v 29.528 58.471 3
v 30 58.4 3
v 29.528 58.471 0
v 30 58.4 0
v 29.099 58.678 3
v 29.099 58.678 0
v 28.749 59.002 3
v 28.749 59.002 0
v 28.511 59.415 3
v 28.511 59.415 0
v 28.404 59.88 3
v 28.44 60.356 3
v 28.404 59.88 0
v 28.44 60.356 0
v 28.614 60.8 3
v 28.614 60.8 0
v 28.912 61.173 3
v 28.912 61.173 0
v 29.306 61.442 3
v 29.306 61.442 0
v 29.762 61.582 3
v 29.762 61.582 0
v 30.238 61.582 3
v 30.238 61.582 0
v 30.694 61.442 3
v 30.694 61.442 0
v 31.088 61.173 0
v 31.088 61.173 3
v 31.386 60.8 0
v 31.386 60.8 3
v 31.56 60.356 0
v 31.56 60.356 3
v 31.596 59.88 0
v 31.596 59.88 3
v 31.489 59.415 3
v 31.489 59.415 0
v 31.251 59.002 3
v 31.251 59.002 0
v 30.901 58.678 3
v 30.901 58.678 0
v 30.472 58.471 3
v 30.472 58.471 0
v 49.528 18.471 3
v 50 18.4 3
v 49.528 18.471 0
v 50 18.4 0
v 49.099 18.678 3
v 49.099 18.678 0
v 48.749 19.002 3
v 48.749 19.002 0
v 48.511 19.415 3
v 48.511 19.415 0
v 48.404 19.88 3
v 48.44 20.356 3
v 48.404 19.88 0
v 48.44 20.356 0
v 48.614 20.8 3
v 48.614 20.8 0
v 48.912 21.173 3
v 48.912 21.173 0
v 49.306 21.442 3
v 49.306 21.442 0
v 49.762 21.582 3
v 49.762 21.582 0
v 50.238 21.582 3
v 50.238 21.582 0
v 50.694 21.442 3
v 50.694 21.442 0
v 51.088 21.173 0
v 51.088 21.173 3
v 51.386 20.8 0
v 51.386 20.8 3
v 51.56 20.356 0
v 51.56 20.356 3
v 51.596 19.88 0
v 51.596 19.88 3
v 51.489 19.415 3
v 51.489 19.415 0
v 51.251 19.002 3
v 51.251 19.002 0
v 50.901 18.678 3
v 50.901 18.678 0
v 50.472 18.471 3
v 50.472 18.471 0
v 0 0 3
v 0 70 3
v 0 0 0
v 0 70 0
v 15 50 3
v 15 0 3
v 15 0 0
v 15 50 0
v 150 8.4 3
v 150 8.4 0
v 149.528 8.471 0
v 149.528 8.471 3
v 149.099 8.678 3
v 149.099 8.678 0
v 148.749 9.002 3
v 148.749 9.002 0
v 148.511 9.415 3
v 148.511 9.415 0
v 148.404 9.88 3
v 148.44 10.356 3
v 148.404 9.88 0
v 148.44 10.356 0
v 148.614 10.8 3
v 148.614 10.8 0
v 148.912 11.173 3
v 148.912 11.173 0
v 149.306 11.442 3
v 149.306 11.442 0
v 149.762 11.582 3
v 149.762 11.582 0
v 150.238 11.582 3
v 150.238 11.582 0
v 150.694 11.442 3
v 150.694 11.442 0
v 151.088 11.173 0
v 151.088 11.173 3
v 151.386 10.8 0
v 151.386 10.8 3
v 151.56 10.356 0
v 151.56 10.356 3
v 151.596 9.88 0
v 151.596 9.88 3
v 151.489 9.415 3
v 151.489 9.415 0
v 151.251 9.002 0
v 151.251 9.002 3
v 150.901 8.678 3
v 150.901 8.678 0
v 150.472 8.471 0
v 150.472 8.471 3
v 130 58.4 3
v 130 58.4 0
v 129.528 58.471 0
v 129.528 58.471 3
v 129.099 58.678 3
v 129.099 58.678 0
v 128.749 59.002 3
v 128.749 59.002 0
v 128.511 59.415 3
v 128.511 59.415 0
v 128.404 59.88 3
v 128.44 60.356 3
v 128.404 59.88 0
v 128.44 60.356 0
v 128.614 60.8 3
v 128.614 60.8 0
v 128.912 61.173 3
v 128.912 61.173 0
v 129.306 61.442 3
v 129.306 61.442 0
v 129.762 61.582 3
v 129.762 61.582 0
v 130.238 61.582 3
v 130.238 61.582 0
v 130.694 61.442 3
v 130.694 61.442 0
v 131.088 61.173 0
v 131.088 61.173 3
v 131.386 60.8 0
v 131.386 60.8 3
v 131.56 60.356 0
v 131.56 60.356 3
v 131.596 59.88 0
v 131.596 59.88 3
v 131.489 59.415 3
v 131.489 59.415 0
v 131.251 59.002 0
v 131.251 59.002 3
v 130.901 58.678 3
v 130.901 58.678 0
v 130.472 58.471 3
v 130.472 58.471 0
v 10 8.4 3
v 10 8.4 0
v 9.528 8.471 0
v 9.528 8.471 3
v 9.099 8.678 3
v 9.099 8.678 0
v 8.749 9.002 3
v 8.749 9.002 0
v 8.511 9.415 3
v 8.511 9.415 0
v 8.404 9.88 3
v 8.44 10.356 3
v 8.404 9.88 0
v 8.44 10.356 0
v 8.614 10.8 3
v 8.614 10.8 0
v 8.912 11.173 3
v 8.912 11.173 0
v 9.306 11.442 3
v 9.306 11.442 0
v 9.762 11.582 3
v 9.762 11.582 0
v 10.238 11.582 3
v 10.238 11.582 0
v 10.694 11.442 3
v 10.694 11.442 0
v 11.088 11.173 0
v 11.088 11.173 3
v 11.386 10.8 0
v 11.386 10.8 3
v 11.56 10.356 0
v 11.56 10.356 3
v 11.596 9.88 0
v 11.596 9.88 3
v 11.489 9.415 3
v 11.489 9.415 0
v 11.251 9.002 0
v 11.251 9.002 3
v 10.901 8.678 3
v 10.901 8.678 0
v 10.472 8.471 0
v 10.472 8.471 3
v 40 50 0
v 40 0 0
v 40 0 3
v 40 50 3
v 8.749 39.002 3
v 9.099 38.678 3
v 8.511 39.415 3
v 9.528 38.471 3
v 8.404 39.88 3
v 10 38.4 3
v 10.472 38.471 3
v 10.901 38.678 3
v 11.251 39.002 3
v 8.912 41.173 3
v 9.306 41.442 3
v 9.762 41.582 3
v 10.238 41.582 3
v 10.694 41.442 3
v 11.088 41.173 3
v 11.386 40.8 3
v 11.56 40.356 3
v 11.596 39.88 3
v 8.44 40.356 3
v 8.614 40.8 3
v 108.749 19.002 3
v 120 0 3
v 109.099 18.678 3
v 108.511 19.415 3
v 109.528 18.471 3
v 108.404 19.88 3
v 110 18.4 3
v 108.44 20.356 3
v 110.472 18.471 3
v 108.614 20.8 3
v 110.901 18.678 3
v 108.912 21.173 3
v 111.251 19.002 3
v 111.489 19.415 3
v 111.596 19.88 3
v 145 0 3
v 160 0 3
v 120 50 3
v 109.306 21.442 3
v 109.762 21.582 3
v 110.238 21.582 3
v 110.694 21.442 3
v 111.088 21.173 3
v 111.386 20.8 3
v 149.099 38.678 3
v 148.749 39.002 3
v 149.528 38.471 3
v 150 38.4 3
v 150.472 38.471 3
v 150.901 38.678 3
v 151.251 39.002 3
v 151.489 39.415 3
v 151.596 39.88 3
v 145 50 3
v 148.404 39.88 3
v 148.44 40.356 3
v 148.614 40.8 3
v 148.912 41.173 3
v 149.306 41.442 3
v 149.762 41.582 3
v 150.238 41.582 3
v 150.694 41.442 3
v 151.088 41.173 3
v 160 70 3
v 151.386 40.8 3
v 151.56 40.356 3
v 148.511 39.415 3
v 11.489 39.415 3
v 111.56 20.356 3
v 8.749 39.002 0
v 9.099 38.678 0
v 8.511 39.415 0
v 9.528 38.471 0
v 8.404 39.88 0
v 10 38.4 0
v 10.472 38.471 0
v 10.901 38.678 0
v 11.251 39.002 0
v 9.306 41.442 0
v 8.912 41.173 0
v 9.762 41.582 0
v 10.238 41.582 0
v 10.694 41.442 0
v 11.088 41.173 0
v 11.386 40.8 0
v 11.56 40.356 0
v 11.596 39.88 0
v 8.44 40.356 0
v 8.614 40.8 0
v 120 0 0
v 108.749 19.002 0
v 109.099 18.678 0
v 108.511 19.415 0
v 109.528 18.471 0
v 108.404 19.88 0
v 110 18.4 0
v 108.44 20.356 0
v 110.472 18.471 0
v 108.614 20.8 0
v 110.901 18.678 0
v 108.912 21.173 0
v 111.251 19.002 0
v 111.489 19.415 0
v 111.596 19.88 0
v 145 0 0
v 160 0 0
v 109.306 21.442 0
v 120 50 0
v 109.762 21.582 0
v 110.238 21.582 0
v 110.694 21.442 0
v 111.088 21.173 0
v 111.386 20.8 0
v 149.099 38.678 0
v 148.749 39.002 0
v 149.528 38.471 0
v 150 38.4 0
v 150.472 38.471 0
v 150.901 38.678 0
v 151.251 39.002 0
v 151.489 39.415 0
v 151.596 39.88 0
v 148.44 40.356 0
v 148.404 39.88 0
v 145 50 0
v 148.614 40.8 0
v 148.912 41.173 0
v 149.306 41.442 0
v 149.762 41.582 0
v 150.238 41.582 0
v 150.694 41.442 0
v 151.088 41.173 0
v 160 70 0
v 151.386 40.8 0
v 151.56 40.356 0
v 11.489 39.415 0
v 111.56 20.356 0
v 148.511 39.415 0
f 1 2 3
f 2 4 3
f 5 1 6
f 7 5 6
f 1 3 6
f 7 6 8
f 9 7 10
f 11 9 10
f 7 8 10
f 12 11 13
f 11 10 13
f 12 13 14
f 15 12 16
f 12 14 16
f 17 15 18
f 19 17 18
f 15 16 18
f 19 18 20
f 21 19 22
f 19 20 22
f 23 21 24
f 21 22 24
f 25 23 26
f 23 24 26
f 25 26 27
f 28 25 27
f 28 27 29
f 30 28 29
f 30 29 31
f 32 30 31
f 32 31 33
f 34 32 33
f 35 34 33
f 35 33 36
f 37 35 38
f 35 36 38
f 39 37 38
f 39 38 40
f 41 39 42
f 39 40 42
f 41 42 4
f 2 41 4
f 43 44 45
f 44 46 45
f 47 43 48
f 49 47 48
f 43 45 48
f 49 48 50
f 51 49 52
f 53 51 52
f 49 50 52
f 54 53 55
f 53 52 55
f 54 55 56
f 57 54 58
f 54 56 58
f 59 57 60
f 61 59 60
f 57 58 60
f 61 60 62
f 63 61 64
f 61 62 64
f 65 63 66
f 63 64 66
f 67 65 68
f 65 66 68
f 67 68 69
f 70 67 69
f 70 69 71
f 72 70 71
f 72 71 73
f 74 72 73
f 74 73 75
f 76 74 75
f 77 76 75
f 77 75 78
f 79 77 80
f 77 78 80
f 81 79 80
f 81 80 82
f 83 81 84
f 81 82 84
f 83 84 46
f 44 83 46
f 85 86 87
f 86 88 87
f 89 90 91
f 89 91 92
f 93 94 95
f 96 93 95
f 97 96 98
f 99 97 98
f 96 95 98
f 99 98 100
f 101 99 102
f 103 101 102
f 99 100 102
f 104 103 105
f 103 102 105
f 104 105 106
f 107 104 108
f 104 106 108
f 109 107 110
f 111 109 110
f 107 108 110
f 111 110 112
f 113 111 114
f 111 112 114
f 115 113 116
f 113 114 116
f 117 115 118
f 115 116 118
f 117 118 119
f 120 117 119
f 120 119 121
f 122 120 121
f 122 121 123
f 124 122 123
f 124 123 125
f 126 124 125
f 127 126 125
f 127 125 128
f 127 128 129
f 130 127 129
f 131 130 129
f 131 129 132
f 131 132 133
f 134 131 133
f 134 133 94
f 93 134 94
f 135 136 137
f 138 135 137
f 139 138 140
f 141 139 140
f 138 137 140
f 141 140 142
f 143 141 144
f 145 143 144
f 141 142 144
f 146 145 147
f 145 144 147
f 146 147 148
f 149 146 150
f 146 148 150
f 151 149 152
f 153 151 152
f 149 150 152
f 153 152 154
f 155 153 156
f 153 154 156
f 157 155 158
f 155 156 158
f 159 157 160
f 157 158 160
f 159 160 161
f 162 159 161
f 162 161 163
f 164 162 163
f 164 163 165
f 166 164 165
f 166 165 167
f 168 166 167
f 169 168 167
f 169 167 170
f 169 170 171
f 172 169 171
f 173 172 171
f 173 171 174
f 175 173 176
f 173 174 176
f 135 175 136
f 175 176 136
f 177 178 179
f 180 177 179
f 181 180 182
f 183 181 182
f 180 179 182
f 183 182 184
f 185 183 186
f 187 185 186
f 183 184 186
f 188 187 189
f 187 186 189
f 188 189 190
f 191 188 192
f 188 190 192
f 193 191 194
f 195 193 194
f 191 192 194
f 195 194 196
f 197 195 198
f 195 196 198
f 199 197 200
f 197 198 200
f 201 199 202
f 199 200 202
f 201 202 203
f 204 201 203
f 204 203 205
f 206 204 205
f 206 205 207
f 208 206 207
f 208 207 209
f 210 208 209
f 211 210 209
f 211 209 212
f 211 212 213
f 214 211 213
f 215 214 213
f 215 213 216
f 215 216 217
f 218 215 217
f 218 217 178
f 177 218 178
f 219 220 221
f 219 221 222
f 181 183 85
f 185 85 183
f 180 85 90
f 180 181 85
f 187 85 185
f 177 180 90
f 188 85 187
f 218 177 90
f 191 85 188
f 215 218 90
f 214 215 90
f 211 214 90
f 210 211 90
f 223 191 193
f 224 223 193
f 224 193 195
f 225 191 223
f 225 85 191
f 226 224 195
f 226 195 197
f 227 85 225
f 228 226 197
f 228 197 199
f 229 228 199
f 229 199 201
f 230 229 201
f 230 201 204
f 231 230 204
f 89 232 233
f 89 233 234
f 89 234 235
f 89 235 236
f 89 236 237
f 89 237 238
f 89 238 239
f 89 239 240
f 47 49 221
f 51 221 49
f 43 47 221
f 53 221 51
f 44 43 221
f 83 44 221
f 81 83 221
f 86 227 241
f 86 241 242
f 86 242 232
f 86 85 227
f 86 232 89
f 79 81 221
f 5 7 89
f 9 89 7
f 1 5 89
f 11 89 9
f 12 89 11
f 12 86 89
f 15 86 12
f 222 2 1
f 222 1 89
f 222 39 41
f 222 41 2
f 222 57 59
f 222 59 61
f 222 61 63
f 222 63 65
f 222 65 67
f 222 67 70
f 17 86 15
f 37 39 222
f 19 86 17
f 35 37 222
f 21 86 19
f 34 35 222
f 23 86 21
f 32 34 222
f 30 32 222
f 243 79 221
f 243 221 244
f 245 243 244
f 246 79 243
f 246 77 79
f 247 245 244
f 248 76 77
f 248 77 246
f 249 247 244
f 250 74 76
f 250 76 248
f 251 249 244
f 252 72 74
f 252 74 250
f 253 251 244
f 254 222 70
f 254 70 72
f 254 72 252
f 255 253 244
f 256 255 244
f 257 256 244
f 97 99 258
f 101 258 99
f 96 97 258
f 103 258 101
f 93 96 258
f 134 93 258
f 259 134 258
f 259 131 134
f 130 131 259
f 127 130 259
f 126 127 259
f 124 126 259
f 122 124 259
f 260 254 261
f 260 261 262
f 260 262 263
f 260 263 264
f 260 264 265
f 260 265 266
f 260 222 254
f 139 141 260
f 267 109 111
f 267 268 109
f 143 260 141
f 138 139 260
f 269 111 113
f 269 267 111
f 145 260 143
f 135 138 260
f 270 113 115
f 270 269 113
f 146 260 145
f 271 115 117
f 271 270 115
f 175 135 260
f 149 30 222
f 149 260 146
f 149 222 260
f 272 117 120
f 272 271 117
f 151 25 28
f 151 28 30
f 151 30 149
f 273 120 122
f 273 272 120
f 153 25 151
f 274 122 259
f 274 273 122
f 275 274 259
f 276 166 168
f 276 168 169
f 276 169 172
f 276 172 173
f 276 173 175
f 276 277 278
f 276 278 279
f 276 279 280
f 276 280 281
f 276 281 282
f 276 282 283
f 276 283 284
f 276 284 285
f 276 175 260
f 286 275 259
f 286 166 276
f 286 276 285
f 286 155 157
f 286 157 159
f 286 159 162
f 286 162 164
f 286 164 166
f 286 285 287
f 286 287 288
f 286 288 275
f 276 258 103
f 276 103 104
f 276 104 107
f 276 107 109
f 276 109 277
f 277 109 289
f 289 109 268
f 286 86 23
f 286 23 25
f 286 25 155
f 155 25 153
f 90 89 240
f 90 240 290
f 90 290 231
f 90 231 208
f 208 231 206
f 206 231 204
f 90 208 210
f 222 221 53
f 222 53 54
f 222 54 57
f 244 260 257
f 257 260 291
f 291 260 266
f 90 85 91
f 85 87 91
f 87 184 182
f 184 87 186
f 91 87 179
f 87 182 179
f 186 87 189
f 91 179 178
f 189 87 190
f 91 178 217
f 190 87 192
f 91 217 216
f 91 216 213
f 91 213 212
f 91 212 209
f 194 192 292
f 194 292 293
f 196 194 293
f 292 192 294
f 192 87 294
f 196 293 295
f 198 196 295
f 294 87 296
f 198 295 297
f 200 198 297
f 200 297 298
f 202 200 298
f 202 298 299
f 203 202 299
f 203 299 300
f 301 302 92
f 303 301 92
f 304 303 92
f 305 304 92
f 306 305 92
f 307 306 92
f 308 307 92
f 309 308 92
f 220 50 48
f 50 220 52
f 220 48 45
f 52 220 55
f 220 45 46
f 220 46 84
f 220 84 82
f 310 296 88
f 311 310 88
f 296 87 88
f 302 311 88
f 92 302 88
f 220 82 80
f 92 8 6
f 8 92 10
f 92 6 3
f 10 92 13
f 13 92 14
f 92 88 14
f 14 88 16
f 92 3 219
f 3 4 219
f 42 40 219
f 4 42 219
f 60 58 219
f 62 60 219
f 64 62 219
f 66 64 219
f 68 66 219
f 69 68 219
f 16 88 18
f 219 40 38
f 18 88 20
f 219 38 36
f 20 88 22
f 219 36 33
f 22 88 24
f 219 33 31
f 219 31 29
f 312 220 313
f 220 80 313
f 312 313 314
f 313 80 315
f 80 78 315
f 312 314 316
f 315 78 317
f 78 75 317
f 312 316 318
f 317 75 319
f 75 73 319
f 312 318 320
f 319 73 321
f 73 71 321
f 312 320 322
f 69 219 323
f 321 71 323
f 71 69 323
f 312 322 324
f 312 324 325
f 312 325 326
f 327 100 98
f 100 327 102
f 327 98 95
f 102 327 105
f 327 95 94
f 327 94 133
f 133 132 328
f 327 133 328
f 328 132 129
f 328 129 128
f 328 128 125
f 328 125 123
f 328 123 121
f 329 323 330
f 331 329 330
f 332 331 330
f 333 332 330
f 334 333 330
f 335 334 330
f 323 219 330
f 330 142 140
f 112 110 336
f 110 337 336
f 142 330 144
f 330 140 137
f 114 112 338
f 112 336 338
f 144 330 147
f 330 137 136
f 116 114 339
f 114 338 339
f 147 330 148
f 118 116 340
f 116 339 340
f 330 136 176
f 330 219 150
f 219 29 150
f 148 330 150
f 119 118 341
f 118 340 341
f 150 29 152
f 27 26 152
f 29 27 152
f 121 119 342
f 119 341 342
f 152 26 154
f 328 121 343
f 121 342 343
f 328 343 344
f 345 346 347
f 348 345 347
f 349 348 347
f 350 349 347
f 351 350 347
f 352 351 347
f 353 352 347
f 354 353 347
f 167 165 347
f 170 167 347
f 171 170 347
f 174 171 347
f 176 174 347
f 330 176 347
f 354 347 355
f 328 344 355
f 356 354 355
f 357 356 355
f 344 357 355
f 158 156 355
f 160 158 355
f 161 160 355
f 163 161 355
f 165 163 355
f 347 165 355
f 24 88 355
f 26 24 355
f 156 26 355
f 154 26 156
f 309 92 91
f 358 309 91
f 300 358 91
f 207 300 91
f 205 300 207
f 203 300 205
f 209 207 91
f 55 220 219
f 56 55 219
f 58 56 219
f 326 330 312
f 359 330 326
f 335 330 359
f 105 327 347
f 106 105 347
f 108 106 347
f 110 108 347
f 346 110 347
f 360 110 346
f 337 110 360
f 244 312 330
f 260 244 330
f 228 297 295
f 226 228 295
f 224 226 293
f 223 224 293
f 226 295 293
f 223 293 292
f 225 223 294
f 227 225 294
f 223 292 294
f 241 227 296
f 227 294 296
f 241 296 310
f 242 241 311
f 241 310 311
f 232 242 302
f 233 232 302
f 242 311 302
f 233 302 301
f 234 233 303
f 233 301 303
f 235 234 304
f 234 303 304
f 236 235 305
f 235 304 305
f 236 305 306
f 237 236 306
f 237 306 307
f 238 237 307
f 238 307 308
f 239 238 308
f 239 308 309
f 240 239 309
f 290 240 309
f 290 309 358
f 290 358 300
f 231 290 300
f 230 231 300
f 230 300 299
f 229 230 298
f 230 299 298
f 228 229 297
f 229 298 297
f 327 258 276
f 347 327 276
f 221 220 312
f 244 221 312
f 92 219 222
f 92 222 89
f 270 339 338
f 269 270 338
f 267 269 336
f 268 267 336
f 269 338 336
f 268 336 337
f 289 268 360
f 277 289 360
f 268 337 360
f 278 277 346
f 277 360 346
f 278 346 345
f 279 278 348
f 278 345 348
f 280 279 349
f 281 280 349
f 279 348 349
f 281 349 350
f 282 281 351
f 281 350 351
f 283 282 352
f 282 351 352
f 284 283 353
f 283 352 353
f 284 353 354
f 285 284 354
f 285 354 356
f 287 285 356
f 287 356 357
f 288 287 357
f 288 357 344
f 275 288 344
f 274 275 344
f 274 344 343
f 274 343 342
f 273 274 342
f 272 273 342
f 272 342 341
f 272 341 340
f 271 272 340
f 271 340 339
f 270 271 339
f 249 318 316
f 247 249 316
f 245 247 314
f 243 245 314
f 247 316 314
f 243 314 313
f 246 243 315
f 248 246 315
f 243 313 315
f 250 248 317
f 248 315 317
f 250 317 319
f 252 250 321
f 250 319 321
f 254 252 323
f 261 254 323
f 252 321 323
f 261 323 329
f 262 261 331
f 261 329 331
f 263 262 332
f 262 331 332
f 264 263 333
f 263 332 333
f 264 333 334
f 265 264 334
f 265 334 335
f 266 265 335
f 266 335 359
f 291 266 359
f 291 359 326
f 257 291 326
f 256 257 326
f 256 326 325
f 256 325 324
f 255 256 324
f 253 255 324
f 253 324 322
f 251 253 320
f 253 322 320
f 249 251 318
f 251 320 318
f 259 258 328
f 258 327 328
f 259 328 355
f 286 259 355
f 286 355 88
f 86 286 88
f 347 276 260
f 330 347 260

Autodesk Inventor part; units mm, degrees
ref_plane "YZ Plane" through (0, 0, 0) normal (1, 0, 0) x (0, 1, 0)
ref_plane "XZ Plane" through (0, 0, 0) normal (0, 1, 0) x (-1, 0, 0)
ref_plane "XY Plane" through (0, 0, 0) normal (0, 0, 1) x (1, 0, 0)
sketch "スケッチ1" plane through (0, 0, 0) normal (0, 0, 1) x (1, 0, 0)
  line L0 (0, 0) -> (160, 0)
  line L1 (160, 0) -> (160, 70)
  line L2 (160, 70) -> (0, 70)
  line L3 (0, 70) -> (0, 0)
  line L4 (20, 0) -> (40, 0)
  line L5 (40, 0) -> (40, 50)
  line L6 (40, 50) -> (20, 50)
  line L7 (20, 50) -> (20, 0)
  line L8 (140, 0) -> (120, 0)
  line L9 (120, 0) -> (120, 50)
  line L10 (120, 50) -> (140, 50)
  line L11 (140, 50) -> (140, 0)
  dimension "d0" = 70
  dimension "d1" = 160
  dimension "d2" = 20
  dimension "d3" = 20
  dimension "d4" = 50
  dimension "d5" = 20
  dimension "d6" = 20
  dimension "d7" = 50
extrude "押し出し1" add sketch "スケッチ1" along normal blind 3 contours L3 L2 L1 L0 L11 L10 L9 L5 L6 L7
sketch "スケッチ2" plane through (0, 0, 3) normal (0, 0, 1) x (1, 0, 0)
  line L0 (0, 70) -> (0, 0) projected
  line L1 (0, 0) -> (20, 0) projected
  line L2 (140, 0) -> (160, 0) projected
  line L3 (160, 0) -> (160, 70) projected
  point P0 (10, 10)
  point P1 (150, 10)
  point P2 (10, 40)
  point P3 (150, 40)
  dimension "d10" = 10
  dimension "d11" = 10
  dimension "d12" = 10
  dimension "d13" = 10
  dimension "d14" = 30
  dimension "d15" = 10
  dimension "d16" = 10
  dimension "d17" = 30
hole "穴1" at (10, 10, 3) at (150, 10, 3) at (10, 40, 3) at (150, 40, 3) direction (0, 0, -1) diameter 3.2 end through all
sketch "スケッチ3" plane through (0, 0, 3) normal (0, 0, 1) x (1, 0, 0)
  line L0 (0, 70) -> (0, 0) projected
  line L1 (160, 70) -> (0, 70) projected
  point P0 (30, 60)
  point P1 (130, 60)
  dimension "d25" = 30
  dimension "d26" = 10
  dimension "d27" = 10
  dimension "d28" = 100
hole "穴2" at (30, 60, 3) at (130, 60, 3) direction (0, 0, -1) diameter 3.2 end through all
sketch "スケッチ4" plane through (0, 0, 3) normal (0, 0, 1) x (1, 0, 0)
  line L0 (40, 0) -> (120, 0) projected
  line L1 (40, 50) -> (40, 0) projected
  line L2 (120, 0) -> (120, 50) projected
  point P0 (0, 0)
  point P1 (50, 20)
  point P2 (40, 25)
  point P3 (110, 20)
  dimension "d38" = 20
  dimension "d39" = 10
  dimension "d40" = 20
  dimension "d41" = 10
hole "穴3" at (50, 20, 3) at (110, 20, 3) direction (0, 0, -1) diameter 3.2 end through all
sketch "スケッチ5" plane through (0, 0, 3) normal (0, 0, 1) x (1, 0, 0)
  line L0 (20, 0) -> (20, 50) projected
  line L1 (20, 0) -> (15, 0)
  line L2 (15, 0) -> (15, 50)
  line L3 (15, 50) -> (20, 50)
  line L4 (20, 50) -> (20, 0)
  point P0 (0, 0)
  dimension "d49" = 50
  dimension "d50" = 5
extrude "押し出し2" cut sketch "スケッチ5" against normal blind 3
sketch "スケッチ6" plane through (0, 0, 3) normal (0, 0, 1) x (1, 0, 0)
  line L0 (140, 50) -> (140, 0) projected
  line L1 (140, 0) -> (145, 0)
  line L2 (145, 0) -> (145, 50)
  line L3 (145, 50) -> (140, 50)
  line L4 (140, 50) -> (140, 0)
  point P0 (0, 0)
  dimension "d53" = 50
  dimension "d54" = 5
extrude "押し出し3" cut sketch "スケッチ6" against normal blind 3
properties part number "backPlate" material "アルミニウム 6061"
